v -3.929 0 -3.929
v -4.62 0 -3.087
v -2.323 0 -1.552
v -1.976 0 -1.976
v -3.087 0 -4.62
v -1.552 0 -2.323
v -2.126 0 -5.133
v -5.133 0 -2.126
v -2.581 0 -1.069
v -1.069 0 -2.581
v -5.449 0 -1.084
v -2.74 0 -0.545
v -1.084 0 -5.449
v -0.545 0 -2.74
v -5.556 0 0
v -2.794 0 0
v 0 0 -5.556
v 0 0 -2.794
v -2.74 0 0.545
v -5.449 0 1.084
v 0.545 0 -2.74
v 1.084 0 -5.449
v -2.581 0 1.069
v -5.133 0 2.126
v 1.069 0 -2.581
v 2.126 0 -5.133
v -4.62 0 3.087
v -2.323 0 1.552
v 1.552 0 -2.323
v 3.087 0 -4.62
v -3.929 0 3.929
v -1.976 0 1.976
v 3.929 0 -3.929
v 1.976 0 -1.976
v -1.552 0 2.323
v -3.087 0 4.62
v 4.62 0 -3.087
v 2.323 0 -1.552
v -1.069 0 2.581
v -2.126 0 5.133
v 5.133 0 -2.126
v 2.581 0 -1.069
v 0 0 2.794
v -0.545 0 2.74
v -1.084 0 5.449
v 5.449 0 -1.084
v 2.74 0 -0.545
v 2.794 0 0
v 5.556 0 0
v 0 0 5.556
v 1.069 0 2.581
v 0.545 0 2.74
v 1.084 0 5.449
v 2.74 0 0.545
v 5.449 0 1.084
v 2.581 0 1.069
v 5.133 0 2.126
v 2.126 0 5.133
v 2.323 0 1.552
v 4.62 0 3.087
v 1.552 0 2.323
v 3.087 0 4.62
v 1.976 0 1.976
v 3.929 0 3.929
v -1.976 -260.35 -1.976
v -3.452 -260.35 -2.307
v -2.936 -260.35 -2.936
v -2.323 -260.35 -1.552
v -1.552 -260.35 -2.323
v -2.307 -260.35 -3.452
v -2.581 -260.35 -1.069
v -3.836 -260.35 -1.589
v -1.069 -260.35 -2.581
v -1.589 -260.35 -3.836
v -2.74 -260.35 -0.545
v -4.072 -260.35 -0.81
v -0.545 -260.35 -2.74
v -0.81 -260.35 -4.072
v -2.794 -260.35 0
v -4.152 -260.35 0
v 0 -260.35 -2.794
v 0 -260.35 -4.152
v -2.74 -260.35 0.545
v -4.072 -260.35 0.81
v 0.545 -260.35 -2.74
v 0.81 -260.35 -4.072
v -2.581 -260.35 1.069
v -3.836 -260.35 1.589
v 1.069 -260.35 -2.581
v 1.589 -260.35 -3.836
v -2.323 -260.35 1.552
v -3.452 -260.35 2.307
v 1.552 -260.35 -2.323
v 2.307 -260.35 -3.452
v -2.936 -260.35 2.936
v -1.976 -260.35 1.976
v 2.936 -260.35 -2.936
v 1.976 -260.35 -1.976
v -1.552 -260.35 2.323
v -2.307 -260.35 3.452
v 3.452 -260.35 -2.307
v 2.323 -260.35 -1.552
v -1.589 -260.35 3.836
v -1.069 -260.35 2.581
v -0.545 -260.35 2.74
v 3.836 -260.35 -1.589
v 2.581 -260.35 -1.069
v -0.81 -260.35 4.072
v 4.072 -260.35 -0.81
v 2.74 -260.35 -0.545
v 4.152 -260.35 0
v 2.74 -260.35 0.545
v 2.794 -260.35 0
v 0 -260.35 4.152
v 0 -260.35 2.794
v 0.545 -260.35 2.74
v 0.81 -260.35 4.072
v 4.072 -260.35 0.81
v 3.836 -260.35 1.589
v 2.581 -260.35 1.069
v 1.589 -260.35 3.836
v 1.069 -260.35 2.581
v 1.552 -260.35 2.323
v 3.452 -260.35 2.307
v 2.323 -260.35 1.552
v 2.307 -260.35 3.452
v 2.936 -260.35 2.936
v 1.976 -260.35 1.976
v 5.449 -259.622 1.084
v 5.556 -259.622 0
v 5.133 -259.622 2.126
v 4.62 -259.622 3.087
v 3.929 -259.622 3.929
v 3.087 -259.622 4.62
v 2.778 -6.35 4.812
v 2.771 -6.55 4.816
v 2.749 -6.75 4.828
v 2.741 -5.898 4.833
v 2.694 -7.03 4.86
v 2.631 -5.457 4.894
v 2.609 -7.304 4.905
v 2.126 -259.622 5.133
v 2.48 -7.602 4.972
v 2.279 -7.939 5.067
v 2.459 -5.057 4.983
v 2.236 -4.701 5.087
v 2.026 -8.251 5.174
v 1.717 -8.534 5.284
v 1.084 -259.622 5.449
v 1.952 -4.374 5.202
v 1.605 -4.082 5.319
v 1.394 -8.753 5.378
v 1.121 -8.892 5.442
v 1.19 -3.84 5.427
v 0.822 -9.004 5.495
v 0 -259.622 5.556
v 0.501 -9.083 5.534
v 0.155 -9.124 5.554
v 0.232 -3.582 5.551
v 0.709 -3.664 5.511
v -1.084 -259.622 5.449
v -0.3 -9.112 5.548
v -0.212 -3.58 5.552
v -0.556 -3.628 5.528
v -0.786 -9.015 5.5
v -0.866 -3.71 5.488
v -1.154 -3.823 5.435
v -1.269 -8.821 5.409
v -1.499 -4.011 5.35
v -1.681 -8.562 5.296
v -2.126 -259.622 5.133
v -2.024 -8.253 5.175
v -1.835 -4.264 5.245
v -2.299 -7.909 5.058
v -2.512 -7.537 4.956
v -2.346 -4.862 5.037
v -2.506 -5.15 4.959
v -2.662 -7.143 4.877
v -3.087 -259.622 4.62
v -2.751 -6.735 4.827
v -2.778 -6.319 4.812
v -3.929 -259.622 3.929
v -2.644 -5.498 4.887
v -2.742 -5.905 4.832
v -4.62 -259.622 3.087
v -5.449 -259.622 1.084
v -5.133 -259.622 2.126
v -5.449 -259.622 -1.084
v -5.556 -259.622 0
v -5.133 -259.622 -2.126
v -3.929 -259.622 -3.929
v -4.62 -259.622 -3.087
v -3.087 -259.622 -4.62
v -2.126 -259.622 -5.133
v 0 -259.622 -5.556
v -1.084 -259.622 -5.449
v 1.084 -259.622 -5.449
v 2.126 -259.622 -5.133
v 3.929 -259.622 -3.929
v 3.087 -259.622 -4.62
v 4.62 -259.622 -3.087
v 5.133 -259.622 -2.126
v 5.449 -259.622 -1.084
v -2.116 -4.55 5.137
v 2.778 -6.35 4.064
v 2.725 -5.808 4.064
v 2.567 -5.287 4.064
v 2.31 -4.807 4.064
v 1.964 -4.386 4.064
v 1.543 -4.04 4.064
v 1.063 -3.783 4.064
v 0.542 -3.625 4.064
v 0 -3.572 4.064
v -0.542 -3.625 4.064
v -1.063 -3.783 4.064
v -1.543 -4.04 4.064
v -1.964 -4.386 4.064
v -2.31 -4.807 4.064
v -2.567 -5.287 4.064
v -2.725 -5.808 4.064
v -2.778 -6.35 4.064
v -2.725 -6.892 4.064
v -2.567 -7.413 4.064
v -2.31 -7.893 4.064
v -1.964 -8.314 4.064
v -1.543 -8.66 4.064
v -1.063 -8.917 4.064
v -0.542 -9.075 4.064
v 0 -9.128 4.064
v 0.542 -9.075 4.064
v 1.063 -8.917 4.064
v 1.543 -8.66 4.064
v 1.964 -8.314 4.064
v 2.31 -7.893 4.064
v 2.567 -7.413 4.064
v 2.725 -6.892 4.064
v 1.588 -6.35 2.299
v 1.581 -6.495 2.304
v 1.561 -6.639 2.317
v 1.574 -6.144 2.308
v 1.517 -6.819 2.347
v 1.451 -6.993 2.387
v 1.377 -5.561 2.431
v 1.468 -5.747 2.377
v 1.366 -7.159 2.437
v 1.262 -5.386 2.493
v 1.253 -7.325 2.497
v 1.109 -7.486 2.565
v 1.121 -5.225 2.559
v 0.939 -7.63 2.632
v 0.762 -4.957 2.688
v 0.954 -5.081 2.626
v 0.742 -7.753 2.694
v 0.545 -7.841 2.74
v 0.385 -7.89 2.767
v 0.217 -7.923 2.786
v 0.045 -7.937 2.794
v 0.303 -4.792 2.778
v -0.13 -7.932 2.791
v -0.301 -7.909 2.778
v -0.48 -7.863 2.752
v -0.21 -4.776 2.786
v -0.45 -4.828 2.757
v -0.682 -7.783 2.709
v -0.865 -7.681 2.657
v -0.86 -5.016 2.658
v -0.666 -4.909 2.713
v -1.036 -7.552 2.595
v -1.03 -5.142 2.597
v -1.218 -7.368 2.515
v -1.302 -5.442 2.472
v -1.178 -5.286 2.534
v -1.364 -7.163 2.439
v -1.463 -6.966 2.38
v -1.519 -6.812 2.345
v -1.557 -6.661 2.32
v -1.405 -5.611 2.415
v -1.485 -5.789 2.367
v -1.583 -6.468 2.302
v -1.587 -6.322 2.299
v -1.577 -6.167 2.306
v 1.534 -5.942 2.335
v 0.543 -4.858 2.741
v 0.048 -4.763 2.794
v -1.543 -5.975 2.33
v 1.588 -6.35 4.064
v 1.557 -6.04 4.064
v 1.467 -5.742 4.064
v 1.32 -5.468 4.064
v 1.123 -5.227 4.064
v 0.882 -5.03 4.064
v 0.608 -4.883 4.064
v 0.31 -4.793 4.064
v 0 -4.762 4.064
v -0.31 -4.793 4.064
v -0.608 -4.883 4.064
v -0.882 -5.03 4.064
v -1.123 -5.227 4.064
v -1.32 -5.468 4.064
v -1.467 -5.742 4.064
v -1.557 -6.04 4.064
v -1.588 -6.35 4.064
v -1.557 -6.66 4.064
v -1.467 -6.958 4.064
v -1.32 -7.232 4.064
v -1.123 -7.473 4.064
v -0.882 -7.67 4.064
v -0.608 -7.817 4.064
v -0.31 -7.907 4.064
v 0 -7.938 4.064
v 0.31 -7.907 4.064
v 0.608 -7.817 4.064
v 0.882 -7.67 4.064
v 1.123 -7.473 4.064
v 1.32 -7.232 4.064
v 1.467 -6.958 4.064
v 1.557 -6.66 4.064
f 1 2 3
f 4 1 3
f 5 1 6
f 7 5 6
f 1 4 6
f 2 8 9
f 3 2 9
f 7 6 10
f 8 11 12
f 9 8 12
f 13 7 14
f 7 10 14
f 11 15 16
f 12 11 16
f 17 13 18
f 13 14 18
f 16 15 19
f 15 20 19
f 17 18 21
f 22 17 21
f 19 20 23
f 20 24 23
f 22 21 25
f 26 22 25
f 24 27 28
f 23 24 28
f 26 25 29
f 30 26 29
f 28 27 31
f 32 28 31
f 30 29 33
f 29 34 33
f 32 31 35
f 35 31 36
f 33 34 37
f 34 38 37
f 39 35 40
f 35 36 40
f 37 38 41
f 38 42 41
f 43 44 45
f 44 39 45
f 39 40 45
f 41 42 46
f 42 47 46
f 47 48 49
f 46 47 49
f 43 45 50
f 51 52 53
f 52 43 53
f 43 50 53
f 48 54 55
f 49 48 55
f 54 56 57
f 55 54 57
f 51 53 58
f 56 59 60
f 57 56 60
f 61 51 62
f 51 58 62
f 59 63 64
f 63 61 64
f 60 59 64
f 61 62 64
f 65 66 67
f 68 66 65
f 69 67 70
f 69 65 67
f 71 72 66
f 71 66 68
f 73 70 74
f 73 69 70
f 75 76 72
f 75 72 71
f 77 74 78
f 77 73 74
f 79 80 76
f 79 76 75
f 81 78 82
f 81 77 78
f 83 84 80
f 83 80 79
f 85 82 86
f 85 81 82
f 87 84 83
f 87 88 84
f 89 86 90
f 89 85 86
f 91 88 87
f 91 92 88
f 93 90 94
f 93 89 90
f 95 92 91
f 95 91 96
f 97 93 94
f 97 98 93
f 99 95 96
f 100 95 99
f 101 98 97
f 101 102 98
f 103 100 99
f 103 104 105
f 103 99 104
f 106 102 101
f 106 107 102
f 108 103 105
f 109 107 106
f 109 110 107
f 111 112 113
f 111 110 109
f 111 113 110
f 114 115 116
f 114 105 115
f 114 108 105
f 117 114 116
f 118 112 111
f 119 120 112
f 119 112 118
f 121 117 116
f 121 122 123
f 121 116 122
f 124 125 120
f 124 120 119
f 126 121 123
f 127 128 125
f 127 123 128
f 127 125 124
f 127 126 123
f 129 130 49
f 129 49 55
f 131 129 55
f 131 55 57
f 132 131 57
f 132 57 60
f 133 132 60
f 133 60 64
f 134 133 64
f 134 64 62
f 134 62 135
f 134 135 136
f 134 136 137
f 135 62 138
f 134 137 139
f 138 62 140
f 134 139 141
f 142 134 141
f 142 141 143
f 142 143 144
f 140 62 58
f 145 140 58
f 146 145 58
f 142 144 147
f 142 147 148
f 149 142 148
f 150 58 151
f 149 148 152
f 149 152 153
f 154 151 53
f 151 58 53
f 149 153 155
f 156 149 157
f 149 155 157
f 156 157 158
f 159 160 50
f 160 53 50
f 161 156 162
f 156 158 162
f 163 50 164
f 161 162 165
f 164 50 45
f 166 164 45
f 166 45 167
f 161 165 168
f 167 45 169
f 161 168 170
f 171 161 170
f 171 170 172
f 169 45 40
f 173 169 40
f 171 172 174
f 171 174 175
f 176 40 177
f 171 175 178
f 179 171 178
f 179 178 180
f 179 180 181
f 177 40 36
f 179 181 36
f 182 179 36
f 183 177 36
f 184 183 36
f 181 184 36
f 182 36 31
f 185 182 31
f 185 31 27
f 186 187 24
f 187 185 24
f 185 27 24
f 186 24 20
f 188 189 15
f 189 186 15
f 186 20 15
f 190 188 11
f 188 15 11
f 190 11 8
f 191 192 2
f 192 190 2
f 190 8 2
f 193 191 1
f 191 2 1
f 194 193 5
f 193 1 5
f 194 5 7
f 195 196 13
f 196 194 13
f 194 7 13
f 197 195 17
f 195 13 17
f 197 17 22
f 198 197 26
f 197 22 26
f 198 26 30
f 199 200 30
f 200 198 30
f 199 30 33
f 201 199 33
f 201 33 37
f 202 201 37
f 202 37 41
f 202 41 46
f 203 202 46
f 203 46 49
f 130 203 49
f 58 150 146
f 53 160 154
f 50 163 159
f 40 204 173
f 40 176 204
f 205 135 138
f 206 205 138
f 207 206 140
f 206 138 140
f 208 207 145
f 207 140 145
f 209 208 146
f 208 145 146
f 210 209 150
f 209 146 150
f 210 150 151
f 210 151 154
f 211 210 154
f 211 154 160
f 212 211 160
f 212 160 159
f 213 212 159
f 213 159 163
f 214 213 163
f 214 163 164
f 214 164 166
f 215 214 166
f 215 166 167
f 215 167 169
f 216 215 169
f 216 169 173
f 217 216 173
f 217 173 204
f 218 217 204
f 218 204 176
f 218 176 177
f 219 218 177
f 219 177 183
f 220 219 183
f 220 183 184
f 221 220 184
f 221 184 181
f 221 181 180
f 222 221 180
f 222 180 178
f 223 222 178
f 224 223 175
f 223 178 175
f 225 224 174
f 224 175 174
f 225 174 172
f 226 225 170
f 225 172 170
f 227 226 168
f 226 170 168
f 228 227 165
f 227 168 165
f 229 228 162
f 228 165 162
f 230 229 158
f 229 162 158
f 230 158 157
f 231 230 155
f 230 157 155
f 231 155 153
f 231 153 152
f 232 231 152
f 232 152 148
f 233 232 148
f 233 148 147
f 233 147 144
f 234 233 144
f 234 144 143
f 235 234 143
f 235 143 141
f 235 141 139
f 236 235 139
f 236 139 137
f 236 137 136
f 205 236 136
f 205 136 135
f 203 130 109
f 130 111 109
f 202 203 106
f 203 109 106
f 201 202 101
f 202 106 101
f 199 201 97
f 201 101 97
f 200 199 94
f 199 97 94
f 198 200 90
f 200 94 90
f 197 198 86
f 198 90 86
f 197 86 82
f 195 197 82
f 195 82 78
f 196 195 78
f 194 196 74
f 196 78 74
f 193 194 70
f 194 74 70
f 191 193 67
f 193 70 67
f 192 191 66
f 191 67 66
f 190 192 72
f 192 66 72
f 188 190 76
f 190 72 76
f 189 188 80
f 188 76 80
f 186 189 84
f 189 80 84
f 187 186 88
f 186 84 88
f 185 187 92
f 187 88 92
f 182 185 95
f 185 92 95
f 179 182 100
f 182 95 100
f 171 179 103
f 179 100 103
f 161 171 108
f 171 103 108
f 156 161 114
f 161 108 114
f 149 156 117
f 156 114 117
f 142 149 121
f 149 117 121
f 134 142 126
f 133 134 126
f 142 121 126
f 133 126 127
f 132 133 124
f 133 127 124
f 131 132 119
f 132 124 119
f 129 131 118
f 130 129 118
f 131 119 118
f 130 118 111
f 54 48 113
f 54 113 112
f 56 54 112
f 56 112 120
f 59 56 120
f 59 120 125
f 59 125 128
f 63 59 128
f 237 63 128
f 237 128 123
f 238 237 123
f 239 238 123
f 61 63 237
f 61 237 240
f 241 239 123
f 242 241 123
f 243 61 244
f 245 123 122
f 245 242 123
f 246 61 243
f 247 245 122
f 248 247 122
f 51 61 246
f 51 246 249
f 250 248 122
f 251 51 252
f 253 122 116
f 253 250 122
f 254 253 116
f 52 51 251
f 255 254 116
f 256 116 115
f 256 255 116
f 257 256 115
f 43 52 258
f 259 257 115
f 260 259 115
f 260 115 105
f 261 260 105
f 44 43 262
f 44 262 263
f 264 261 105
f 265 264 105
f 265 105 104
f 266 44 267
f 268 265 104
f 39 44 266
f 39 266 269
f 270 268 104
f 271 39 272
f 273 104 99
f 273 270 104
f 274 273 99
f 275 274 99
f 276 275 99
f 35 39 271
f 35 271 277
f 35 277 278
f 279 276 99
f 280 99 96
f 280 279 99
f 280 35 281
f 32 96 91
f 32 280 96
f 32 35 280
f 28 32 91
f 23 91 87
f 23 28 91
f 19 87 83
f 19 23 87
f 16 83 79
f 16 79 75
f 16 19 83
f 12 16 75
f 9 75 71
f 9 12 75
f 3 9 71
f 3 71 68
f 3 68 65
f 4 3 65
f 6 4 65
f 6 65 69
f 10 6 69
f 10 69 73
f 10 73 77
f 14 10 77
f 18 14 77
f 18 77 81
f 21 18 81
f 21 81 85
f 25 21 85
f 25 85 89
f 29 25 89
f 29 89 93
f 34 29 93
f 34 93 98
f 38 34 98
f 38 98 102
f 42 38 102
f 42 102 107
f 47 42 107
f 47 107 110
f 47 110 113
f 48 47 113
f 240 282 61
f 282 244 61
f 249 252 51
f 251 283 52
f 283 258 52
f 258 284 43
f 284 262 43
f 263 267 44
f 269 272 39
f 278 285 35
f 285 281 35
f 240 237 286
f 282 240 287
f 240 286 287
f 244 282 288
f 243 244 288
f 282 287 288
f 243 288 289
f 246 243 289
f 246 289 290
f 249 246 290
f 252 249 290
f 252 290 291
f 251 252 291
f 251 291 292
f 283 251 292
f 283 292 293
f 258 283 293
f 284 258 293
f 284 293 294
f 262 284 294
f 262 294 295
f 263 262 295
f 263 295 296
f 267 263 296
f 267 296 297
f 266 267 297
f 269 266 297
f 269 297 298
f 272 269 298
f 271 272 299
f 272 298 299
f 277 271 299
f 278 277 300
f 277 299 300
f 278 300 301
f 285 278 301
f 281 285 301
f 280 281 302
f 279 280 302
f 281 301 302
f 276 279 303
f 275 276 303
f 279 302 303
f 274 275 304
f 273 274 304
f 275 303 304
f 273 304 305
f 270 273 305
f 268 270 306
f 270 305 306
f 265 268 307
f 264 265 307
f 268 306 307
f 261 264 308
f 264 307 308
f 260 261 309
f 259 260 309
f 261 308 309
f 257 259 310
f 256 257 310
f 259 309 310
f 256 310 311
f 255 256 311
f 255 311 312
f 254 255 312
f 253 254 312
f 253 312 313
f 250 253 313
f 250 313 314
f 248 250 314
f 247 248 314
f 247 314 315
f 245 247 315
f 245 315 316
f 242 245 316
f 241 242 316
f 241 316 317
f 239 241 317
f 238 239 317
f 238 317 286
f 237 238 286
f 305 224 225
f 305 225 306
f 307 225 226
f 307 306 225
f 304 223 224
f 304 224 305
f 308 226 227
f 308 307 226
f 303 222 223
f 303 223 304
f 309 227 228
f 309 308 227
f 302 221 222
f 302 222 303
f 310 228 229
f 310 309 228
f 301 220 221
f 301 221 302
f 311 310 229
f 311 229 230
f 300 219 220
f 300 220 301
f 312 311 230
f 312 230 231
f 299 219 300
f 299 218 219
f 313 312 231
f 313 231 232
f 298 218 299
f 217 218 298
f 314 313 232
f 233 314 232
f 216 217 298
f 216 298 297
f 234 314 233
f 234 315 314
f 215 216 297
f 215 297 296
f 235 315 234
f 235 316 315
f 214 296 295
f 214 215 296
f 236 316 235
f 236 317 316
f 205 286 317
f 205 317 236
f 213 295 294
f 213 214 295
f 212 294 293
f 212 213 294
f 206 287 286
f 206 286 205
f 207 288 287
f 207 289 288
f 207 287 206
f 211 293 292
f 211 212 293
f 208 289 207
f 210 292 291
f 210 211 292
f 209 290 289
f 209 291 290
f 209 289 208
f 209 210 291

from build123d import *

# Parameters (mm, degrees)
F0_R     = 5.55625
F0_R_2   = 2.794
F1_DEPTH = 260.35
F3_R     = 2.778125
F4_DEPTH = 2.286
F5_R     = 1.5875
F6_DEPTH = 2.286


with BuildPart() as f1:
    # F0 (on Front) → F1 (new body)
    with BuildSketch(Plane.XZ):
        Circle(F0_R)
        Circle(F0_R_2, mode=Mode.SUBTRACT)
    extrude(amount=F1_DEPTH)

    # F3 (on offset) → F4 (cut)
    with BuildSketch(Plane.XY.offset(6.35)):
        with Locations((0, -6.35)):
            Circle(F3_R)
    extrude(amount=-F4_DEPTH, mode=Mode.SUBTRACT)

    # F5 (on face) → F6 (cut)
    with BuildSketch(Plane.XY.offset(4.064)):
        with Locations((0, -6.35)):
            Circle(F5_R)
    extrude(amount=-F6_DEPTH, mode=Mode.SUBTRACT)

    # F7 (on Top) → F8 (revolve, cut)
    with BuildSketch(Plane.XY):
        Polygon((6.375642, -259.197921), (3.892762, -260.484248), (6.375642, -261.022687), align=None)
    revolve(axis=Axis((0, -258.301109, 0), (0, 1, 0)), mode=Mode.SUBTRACT)


solid = f1.part
